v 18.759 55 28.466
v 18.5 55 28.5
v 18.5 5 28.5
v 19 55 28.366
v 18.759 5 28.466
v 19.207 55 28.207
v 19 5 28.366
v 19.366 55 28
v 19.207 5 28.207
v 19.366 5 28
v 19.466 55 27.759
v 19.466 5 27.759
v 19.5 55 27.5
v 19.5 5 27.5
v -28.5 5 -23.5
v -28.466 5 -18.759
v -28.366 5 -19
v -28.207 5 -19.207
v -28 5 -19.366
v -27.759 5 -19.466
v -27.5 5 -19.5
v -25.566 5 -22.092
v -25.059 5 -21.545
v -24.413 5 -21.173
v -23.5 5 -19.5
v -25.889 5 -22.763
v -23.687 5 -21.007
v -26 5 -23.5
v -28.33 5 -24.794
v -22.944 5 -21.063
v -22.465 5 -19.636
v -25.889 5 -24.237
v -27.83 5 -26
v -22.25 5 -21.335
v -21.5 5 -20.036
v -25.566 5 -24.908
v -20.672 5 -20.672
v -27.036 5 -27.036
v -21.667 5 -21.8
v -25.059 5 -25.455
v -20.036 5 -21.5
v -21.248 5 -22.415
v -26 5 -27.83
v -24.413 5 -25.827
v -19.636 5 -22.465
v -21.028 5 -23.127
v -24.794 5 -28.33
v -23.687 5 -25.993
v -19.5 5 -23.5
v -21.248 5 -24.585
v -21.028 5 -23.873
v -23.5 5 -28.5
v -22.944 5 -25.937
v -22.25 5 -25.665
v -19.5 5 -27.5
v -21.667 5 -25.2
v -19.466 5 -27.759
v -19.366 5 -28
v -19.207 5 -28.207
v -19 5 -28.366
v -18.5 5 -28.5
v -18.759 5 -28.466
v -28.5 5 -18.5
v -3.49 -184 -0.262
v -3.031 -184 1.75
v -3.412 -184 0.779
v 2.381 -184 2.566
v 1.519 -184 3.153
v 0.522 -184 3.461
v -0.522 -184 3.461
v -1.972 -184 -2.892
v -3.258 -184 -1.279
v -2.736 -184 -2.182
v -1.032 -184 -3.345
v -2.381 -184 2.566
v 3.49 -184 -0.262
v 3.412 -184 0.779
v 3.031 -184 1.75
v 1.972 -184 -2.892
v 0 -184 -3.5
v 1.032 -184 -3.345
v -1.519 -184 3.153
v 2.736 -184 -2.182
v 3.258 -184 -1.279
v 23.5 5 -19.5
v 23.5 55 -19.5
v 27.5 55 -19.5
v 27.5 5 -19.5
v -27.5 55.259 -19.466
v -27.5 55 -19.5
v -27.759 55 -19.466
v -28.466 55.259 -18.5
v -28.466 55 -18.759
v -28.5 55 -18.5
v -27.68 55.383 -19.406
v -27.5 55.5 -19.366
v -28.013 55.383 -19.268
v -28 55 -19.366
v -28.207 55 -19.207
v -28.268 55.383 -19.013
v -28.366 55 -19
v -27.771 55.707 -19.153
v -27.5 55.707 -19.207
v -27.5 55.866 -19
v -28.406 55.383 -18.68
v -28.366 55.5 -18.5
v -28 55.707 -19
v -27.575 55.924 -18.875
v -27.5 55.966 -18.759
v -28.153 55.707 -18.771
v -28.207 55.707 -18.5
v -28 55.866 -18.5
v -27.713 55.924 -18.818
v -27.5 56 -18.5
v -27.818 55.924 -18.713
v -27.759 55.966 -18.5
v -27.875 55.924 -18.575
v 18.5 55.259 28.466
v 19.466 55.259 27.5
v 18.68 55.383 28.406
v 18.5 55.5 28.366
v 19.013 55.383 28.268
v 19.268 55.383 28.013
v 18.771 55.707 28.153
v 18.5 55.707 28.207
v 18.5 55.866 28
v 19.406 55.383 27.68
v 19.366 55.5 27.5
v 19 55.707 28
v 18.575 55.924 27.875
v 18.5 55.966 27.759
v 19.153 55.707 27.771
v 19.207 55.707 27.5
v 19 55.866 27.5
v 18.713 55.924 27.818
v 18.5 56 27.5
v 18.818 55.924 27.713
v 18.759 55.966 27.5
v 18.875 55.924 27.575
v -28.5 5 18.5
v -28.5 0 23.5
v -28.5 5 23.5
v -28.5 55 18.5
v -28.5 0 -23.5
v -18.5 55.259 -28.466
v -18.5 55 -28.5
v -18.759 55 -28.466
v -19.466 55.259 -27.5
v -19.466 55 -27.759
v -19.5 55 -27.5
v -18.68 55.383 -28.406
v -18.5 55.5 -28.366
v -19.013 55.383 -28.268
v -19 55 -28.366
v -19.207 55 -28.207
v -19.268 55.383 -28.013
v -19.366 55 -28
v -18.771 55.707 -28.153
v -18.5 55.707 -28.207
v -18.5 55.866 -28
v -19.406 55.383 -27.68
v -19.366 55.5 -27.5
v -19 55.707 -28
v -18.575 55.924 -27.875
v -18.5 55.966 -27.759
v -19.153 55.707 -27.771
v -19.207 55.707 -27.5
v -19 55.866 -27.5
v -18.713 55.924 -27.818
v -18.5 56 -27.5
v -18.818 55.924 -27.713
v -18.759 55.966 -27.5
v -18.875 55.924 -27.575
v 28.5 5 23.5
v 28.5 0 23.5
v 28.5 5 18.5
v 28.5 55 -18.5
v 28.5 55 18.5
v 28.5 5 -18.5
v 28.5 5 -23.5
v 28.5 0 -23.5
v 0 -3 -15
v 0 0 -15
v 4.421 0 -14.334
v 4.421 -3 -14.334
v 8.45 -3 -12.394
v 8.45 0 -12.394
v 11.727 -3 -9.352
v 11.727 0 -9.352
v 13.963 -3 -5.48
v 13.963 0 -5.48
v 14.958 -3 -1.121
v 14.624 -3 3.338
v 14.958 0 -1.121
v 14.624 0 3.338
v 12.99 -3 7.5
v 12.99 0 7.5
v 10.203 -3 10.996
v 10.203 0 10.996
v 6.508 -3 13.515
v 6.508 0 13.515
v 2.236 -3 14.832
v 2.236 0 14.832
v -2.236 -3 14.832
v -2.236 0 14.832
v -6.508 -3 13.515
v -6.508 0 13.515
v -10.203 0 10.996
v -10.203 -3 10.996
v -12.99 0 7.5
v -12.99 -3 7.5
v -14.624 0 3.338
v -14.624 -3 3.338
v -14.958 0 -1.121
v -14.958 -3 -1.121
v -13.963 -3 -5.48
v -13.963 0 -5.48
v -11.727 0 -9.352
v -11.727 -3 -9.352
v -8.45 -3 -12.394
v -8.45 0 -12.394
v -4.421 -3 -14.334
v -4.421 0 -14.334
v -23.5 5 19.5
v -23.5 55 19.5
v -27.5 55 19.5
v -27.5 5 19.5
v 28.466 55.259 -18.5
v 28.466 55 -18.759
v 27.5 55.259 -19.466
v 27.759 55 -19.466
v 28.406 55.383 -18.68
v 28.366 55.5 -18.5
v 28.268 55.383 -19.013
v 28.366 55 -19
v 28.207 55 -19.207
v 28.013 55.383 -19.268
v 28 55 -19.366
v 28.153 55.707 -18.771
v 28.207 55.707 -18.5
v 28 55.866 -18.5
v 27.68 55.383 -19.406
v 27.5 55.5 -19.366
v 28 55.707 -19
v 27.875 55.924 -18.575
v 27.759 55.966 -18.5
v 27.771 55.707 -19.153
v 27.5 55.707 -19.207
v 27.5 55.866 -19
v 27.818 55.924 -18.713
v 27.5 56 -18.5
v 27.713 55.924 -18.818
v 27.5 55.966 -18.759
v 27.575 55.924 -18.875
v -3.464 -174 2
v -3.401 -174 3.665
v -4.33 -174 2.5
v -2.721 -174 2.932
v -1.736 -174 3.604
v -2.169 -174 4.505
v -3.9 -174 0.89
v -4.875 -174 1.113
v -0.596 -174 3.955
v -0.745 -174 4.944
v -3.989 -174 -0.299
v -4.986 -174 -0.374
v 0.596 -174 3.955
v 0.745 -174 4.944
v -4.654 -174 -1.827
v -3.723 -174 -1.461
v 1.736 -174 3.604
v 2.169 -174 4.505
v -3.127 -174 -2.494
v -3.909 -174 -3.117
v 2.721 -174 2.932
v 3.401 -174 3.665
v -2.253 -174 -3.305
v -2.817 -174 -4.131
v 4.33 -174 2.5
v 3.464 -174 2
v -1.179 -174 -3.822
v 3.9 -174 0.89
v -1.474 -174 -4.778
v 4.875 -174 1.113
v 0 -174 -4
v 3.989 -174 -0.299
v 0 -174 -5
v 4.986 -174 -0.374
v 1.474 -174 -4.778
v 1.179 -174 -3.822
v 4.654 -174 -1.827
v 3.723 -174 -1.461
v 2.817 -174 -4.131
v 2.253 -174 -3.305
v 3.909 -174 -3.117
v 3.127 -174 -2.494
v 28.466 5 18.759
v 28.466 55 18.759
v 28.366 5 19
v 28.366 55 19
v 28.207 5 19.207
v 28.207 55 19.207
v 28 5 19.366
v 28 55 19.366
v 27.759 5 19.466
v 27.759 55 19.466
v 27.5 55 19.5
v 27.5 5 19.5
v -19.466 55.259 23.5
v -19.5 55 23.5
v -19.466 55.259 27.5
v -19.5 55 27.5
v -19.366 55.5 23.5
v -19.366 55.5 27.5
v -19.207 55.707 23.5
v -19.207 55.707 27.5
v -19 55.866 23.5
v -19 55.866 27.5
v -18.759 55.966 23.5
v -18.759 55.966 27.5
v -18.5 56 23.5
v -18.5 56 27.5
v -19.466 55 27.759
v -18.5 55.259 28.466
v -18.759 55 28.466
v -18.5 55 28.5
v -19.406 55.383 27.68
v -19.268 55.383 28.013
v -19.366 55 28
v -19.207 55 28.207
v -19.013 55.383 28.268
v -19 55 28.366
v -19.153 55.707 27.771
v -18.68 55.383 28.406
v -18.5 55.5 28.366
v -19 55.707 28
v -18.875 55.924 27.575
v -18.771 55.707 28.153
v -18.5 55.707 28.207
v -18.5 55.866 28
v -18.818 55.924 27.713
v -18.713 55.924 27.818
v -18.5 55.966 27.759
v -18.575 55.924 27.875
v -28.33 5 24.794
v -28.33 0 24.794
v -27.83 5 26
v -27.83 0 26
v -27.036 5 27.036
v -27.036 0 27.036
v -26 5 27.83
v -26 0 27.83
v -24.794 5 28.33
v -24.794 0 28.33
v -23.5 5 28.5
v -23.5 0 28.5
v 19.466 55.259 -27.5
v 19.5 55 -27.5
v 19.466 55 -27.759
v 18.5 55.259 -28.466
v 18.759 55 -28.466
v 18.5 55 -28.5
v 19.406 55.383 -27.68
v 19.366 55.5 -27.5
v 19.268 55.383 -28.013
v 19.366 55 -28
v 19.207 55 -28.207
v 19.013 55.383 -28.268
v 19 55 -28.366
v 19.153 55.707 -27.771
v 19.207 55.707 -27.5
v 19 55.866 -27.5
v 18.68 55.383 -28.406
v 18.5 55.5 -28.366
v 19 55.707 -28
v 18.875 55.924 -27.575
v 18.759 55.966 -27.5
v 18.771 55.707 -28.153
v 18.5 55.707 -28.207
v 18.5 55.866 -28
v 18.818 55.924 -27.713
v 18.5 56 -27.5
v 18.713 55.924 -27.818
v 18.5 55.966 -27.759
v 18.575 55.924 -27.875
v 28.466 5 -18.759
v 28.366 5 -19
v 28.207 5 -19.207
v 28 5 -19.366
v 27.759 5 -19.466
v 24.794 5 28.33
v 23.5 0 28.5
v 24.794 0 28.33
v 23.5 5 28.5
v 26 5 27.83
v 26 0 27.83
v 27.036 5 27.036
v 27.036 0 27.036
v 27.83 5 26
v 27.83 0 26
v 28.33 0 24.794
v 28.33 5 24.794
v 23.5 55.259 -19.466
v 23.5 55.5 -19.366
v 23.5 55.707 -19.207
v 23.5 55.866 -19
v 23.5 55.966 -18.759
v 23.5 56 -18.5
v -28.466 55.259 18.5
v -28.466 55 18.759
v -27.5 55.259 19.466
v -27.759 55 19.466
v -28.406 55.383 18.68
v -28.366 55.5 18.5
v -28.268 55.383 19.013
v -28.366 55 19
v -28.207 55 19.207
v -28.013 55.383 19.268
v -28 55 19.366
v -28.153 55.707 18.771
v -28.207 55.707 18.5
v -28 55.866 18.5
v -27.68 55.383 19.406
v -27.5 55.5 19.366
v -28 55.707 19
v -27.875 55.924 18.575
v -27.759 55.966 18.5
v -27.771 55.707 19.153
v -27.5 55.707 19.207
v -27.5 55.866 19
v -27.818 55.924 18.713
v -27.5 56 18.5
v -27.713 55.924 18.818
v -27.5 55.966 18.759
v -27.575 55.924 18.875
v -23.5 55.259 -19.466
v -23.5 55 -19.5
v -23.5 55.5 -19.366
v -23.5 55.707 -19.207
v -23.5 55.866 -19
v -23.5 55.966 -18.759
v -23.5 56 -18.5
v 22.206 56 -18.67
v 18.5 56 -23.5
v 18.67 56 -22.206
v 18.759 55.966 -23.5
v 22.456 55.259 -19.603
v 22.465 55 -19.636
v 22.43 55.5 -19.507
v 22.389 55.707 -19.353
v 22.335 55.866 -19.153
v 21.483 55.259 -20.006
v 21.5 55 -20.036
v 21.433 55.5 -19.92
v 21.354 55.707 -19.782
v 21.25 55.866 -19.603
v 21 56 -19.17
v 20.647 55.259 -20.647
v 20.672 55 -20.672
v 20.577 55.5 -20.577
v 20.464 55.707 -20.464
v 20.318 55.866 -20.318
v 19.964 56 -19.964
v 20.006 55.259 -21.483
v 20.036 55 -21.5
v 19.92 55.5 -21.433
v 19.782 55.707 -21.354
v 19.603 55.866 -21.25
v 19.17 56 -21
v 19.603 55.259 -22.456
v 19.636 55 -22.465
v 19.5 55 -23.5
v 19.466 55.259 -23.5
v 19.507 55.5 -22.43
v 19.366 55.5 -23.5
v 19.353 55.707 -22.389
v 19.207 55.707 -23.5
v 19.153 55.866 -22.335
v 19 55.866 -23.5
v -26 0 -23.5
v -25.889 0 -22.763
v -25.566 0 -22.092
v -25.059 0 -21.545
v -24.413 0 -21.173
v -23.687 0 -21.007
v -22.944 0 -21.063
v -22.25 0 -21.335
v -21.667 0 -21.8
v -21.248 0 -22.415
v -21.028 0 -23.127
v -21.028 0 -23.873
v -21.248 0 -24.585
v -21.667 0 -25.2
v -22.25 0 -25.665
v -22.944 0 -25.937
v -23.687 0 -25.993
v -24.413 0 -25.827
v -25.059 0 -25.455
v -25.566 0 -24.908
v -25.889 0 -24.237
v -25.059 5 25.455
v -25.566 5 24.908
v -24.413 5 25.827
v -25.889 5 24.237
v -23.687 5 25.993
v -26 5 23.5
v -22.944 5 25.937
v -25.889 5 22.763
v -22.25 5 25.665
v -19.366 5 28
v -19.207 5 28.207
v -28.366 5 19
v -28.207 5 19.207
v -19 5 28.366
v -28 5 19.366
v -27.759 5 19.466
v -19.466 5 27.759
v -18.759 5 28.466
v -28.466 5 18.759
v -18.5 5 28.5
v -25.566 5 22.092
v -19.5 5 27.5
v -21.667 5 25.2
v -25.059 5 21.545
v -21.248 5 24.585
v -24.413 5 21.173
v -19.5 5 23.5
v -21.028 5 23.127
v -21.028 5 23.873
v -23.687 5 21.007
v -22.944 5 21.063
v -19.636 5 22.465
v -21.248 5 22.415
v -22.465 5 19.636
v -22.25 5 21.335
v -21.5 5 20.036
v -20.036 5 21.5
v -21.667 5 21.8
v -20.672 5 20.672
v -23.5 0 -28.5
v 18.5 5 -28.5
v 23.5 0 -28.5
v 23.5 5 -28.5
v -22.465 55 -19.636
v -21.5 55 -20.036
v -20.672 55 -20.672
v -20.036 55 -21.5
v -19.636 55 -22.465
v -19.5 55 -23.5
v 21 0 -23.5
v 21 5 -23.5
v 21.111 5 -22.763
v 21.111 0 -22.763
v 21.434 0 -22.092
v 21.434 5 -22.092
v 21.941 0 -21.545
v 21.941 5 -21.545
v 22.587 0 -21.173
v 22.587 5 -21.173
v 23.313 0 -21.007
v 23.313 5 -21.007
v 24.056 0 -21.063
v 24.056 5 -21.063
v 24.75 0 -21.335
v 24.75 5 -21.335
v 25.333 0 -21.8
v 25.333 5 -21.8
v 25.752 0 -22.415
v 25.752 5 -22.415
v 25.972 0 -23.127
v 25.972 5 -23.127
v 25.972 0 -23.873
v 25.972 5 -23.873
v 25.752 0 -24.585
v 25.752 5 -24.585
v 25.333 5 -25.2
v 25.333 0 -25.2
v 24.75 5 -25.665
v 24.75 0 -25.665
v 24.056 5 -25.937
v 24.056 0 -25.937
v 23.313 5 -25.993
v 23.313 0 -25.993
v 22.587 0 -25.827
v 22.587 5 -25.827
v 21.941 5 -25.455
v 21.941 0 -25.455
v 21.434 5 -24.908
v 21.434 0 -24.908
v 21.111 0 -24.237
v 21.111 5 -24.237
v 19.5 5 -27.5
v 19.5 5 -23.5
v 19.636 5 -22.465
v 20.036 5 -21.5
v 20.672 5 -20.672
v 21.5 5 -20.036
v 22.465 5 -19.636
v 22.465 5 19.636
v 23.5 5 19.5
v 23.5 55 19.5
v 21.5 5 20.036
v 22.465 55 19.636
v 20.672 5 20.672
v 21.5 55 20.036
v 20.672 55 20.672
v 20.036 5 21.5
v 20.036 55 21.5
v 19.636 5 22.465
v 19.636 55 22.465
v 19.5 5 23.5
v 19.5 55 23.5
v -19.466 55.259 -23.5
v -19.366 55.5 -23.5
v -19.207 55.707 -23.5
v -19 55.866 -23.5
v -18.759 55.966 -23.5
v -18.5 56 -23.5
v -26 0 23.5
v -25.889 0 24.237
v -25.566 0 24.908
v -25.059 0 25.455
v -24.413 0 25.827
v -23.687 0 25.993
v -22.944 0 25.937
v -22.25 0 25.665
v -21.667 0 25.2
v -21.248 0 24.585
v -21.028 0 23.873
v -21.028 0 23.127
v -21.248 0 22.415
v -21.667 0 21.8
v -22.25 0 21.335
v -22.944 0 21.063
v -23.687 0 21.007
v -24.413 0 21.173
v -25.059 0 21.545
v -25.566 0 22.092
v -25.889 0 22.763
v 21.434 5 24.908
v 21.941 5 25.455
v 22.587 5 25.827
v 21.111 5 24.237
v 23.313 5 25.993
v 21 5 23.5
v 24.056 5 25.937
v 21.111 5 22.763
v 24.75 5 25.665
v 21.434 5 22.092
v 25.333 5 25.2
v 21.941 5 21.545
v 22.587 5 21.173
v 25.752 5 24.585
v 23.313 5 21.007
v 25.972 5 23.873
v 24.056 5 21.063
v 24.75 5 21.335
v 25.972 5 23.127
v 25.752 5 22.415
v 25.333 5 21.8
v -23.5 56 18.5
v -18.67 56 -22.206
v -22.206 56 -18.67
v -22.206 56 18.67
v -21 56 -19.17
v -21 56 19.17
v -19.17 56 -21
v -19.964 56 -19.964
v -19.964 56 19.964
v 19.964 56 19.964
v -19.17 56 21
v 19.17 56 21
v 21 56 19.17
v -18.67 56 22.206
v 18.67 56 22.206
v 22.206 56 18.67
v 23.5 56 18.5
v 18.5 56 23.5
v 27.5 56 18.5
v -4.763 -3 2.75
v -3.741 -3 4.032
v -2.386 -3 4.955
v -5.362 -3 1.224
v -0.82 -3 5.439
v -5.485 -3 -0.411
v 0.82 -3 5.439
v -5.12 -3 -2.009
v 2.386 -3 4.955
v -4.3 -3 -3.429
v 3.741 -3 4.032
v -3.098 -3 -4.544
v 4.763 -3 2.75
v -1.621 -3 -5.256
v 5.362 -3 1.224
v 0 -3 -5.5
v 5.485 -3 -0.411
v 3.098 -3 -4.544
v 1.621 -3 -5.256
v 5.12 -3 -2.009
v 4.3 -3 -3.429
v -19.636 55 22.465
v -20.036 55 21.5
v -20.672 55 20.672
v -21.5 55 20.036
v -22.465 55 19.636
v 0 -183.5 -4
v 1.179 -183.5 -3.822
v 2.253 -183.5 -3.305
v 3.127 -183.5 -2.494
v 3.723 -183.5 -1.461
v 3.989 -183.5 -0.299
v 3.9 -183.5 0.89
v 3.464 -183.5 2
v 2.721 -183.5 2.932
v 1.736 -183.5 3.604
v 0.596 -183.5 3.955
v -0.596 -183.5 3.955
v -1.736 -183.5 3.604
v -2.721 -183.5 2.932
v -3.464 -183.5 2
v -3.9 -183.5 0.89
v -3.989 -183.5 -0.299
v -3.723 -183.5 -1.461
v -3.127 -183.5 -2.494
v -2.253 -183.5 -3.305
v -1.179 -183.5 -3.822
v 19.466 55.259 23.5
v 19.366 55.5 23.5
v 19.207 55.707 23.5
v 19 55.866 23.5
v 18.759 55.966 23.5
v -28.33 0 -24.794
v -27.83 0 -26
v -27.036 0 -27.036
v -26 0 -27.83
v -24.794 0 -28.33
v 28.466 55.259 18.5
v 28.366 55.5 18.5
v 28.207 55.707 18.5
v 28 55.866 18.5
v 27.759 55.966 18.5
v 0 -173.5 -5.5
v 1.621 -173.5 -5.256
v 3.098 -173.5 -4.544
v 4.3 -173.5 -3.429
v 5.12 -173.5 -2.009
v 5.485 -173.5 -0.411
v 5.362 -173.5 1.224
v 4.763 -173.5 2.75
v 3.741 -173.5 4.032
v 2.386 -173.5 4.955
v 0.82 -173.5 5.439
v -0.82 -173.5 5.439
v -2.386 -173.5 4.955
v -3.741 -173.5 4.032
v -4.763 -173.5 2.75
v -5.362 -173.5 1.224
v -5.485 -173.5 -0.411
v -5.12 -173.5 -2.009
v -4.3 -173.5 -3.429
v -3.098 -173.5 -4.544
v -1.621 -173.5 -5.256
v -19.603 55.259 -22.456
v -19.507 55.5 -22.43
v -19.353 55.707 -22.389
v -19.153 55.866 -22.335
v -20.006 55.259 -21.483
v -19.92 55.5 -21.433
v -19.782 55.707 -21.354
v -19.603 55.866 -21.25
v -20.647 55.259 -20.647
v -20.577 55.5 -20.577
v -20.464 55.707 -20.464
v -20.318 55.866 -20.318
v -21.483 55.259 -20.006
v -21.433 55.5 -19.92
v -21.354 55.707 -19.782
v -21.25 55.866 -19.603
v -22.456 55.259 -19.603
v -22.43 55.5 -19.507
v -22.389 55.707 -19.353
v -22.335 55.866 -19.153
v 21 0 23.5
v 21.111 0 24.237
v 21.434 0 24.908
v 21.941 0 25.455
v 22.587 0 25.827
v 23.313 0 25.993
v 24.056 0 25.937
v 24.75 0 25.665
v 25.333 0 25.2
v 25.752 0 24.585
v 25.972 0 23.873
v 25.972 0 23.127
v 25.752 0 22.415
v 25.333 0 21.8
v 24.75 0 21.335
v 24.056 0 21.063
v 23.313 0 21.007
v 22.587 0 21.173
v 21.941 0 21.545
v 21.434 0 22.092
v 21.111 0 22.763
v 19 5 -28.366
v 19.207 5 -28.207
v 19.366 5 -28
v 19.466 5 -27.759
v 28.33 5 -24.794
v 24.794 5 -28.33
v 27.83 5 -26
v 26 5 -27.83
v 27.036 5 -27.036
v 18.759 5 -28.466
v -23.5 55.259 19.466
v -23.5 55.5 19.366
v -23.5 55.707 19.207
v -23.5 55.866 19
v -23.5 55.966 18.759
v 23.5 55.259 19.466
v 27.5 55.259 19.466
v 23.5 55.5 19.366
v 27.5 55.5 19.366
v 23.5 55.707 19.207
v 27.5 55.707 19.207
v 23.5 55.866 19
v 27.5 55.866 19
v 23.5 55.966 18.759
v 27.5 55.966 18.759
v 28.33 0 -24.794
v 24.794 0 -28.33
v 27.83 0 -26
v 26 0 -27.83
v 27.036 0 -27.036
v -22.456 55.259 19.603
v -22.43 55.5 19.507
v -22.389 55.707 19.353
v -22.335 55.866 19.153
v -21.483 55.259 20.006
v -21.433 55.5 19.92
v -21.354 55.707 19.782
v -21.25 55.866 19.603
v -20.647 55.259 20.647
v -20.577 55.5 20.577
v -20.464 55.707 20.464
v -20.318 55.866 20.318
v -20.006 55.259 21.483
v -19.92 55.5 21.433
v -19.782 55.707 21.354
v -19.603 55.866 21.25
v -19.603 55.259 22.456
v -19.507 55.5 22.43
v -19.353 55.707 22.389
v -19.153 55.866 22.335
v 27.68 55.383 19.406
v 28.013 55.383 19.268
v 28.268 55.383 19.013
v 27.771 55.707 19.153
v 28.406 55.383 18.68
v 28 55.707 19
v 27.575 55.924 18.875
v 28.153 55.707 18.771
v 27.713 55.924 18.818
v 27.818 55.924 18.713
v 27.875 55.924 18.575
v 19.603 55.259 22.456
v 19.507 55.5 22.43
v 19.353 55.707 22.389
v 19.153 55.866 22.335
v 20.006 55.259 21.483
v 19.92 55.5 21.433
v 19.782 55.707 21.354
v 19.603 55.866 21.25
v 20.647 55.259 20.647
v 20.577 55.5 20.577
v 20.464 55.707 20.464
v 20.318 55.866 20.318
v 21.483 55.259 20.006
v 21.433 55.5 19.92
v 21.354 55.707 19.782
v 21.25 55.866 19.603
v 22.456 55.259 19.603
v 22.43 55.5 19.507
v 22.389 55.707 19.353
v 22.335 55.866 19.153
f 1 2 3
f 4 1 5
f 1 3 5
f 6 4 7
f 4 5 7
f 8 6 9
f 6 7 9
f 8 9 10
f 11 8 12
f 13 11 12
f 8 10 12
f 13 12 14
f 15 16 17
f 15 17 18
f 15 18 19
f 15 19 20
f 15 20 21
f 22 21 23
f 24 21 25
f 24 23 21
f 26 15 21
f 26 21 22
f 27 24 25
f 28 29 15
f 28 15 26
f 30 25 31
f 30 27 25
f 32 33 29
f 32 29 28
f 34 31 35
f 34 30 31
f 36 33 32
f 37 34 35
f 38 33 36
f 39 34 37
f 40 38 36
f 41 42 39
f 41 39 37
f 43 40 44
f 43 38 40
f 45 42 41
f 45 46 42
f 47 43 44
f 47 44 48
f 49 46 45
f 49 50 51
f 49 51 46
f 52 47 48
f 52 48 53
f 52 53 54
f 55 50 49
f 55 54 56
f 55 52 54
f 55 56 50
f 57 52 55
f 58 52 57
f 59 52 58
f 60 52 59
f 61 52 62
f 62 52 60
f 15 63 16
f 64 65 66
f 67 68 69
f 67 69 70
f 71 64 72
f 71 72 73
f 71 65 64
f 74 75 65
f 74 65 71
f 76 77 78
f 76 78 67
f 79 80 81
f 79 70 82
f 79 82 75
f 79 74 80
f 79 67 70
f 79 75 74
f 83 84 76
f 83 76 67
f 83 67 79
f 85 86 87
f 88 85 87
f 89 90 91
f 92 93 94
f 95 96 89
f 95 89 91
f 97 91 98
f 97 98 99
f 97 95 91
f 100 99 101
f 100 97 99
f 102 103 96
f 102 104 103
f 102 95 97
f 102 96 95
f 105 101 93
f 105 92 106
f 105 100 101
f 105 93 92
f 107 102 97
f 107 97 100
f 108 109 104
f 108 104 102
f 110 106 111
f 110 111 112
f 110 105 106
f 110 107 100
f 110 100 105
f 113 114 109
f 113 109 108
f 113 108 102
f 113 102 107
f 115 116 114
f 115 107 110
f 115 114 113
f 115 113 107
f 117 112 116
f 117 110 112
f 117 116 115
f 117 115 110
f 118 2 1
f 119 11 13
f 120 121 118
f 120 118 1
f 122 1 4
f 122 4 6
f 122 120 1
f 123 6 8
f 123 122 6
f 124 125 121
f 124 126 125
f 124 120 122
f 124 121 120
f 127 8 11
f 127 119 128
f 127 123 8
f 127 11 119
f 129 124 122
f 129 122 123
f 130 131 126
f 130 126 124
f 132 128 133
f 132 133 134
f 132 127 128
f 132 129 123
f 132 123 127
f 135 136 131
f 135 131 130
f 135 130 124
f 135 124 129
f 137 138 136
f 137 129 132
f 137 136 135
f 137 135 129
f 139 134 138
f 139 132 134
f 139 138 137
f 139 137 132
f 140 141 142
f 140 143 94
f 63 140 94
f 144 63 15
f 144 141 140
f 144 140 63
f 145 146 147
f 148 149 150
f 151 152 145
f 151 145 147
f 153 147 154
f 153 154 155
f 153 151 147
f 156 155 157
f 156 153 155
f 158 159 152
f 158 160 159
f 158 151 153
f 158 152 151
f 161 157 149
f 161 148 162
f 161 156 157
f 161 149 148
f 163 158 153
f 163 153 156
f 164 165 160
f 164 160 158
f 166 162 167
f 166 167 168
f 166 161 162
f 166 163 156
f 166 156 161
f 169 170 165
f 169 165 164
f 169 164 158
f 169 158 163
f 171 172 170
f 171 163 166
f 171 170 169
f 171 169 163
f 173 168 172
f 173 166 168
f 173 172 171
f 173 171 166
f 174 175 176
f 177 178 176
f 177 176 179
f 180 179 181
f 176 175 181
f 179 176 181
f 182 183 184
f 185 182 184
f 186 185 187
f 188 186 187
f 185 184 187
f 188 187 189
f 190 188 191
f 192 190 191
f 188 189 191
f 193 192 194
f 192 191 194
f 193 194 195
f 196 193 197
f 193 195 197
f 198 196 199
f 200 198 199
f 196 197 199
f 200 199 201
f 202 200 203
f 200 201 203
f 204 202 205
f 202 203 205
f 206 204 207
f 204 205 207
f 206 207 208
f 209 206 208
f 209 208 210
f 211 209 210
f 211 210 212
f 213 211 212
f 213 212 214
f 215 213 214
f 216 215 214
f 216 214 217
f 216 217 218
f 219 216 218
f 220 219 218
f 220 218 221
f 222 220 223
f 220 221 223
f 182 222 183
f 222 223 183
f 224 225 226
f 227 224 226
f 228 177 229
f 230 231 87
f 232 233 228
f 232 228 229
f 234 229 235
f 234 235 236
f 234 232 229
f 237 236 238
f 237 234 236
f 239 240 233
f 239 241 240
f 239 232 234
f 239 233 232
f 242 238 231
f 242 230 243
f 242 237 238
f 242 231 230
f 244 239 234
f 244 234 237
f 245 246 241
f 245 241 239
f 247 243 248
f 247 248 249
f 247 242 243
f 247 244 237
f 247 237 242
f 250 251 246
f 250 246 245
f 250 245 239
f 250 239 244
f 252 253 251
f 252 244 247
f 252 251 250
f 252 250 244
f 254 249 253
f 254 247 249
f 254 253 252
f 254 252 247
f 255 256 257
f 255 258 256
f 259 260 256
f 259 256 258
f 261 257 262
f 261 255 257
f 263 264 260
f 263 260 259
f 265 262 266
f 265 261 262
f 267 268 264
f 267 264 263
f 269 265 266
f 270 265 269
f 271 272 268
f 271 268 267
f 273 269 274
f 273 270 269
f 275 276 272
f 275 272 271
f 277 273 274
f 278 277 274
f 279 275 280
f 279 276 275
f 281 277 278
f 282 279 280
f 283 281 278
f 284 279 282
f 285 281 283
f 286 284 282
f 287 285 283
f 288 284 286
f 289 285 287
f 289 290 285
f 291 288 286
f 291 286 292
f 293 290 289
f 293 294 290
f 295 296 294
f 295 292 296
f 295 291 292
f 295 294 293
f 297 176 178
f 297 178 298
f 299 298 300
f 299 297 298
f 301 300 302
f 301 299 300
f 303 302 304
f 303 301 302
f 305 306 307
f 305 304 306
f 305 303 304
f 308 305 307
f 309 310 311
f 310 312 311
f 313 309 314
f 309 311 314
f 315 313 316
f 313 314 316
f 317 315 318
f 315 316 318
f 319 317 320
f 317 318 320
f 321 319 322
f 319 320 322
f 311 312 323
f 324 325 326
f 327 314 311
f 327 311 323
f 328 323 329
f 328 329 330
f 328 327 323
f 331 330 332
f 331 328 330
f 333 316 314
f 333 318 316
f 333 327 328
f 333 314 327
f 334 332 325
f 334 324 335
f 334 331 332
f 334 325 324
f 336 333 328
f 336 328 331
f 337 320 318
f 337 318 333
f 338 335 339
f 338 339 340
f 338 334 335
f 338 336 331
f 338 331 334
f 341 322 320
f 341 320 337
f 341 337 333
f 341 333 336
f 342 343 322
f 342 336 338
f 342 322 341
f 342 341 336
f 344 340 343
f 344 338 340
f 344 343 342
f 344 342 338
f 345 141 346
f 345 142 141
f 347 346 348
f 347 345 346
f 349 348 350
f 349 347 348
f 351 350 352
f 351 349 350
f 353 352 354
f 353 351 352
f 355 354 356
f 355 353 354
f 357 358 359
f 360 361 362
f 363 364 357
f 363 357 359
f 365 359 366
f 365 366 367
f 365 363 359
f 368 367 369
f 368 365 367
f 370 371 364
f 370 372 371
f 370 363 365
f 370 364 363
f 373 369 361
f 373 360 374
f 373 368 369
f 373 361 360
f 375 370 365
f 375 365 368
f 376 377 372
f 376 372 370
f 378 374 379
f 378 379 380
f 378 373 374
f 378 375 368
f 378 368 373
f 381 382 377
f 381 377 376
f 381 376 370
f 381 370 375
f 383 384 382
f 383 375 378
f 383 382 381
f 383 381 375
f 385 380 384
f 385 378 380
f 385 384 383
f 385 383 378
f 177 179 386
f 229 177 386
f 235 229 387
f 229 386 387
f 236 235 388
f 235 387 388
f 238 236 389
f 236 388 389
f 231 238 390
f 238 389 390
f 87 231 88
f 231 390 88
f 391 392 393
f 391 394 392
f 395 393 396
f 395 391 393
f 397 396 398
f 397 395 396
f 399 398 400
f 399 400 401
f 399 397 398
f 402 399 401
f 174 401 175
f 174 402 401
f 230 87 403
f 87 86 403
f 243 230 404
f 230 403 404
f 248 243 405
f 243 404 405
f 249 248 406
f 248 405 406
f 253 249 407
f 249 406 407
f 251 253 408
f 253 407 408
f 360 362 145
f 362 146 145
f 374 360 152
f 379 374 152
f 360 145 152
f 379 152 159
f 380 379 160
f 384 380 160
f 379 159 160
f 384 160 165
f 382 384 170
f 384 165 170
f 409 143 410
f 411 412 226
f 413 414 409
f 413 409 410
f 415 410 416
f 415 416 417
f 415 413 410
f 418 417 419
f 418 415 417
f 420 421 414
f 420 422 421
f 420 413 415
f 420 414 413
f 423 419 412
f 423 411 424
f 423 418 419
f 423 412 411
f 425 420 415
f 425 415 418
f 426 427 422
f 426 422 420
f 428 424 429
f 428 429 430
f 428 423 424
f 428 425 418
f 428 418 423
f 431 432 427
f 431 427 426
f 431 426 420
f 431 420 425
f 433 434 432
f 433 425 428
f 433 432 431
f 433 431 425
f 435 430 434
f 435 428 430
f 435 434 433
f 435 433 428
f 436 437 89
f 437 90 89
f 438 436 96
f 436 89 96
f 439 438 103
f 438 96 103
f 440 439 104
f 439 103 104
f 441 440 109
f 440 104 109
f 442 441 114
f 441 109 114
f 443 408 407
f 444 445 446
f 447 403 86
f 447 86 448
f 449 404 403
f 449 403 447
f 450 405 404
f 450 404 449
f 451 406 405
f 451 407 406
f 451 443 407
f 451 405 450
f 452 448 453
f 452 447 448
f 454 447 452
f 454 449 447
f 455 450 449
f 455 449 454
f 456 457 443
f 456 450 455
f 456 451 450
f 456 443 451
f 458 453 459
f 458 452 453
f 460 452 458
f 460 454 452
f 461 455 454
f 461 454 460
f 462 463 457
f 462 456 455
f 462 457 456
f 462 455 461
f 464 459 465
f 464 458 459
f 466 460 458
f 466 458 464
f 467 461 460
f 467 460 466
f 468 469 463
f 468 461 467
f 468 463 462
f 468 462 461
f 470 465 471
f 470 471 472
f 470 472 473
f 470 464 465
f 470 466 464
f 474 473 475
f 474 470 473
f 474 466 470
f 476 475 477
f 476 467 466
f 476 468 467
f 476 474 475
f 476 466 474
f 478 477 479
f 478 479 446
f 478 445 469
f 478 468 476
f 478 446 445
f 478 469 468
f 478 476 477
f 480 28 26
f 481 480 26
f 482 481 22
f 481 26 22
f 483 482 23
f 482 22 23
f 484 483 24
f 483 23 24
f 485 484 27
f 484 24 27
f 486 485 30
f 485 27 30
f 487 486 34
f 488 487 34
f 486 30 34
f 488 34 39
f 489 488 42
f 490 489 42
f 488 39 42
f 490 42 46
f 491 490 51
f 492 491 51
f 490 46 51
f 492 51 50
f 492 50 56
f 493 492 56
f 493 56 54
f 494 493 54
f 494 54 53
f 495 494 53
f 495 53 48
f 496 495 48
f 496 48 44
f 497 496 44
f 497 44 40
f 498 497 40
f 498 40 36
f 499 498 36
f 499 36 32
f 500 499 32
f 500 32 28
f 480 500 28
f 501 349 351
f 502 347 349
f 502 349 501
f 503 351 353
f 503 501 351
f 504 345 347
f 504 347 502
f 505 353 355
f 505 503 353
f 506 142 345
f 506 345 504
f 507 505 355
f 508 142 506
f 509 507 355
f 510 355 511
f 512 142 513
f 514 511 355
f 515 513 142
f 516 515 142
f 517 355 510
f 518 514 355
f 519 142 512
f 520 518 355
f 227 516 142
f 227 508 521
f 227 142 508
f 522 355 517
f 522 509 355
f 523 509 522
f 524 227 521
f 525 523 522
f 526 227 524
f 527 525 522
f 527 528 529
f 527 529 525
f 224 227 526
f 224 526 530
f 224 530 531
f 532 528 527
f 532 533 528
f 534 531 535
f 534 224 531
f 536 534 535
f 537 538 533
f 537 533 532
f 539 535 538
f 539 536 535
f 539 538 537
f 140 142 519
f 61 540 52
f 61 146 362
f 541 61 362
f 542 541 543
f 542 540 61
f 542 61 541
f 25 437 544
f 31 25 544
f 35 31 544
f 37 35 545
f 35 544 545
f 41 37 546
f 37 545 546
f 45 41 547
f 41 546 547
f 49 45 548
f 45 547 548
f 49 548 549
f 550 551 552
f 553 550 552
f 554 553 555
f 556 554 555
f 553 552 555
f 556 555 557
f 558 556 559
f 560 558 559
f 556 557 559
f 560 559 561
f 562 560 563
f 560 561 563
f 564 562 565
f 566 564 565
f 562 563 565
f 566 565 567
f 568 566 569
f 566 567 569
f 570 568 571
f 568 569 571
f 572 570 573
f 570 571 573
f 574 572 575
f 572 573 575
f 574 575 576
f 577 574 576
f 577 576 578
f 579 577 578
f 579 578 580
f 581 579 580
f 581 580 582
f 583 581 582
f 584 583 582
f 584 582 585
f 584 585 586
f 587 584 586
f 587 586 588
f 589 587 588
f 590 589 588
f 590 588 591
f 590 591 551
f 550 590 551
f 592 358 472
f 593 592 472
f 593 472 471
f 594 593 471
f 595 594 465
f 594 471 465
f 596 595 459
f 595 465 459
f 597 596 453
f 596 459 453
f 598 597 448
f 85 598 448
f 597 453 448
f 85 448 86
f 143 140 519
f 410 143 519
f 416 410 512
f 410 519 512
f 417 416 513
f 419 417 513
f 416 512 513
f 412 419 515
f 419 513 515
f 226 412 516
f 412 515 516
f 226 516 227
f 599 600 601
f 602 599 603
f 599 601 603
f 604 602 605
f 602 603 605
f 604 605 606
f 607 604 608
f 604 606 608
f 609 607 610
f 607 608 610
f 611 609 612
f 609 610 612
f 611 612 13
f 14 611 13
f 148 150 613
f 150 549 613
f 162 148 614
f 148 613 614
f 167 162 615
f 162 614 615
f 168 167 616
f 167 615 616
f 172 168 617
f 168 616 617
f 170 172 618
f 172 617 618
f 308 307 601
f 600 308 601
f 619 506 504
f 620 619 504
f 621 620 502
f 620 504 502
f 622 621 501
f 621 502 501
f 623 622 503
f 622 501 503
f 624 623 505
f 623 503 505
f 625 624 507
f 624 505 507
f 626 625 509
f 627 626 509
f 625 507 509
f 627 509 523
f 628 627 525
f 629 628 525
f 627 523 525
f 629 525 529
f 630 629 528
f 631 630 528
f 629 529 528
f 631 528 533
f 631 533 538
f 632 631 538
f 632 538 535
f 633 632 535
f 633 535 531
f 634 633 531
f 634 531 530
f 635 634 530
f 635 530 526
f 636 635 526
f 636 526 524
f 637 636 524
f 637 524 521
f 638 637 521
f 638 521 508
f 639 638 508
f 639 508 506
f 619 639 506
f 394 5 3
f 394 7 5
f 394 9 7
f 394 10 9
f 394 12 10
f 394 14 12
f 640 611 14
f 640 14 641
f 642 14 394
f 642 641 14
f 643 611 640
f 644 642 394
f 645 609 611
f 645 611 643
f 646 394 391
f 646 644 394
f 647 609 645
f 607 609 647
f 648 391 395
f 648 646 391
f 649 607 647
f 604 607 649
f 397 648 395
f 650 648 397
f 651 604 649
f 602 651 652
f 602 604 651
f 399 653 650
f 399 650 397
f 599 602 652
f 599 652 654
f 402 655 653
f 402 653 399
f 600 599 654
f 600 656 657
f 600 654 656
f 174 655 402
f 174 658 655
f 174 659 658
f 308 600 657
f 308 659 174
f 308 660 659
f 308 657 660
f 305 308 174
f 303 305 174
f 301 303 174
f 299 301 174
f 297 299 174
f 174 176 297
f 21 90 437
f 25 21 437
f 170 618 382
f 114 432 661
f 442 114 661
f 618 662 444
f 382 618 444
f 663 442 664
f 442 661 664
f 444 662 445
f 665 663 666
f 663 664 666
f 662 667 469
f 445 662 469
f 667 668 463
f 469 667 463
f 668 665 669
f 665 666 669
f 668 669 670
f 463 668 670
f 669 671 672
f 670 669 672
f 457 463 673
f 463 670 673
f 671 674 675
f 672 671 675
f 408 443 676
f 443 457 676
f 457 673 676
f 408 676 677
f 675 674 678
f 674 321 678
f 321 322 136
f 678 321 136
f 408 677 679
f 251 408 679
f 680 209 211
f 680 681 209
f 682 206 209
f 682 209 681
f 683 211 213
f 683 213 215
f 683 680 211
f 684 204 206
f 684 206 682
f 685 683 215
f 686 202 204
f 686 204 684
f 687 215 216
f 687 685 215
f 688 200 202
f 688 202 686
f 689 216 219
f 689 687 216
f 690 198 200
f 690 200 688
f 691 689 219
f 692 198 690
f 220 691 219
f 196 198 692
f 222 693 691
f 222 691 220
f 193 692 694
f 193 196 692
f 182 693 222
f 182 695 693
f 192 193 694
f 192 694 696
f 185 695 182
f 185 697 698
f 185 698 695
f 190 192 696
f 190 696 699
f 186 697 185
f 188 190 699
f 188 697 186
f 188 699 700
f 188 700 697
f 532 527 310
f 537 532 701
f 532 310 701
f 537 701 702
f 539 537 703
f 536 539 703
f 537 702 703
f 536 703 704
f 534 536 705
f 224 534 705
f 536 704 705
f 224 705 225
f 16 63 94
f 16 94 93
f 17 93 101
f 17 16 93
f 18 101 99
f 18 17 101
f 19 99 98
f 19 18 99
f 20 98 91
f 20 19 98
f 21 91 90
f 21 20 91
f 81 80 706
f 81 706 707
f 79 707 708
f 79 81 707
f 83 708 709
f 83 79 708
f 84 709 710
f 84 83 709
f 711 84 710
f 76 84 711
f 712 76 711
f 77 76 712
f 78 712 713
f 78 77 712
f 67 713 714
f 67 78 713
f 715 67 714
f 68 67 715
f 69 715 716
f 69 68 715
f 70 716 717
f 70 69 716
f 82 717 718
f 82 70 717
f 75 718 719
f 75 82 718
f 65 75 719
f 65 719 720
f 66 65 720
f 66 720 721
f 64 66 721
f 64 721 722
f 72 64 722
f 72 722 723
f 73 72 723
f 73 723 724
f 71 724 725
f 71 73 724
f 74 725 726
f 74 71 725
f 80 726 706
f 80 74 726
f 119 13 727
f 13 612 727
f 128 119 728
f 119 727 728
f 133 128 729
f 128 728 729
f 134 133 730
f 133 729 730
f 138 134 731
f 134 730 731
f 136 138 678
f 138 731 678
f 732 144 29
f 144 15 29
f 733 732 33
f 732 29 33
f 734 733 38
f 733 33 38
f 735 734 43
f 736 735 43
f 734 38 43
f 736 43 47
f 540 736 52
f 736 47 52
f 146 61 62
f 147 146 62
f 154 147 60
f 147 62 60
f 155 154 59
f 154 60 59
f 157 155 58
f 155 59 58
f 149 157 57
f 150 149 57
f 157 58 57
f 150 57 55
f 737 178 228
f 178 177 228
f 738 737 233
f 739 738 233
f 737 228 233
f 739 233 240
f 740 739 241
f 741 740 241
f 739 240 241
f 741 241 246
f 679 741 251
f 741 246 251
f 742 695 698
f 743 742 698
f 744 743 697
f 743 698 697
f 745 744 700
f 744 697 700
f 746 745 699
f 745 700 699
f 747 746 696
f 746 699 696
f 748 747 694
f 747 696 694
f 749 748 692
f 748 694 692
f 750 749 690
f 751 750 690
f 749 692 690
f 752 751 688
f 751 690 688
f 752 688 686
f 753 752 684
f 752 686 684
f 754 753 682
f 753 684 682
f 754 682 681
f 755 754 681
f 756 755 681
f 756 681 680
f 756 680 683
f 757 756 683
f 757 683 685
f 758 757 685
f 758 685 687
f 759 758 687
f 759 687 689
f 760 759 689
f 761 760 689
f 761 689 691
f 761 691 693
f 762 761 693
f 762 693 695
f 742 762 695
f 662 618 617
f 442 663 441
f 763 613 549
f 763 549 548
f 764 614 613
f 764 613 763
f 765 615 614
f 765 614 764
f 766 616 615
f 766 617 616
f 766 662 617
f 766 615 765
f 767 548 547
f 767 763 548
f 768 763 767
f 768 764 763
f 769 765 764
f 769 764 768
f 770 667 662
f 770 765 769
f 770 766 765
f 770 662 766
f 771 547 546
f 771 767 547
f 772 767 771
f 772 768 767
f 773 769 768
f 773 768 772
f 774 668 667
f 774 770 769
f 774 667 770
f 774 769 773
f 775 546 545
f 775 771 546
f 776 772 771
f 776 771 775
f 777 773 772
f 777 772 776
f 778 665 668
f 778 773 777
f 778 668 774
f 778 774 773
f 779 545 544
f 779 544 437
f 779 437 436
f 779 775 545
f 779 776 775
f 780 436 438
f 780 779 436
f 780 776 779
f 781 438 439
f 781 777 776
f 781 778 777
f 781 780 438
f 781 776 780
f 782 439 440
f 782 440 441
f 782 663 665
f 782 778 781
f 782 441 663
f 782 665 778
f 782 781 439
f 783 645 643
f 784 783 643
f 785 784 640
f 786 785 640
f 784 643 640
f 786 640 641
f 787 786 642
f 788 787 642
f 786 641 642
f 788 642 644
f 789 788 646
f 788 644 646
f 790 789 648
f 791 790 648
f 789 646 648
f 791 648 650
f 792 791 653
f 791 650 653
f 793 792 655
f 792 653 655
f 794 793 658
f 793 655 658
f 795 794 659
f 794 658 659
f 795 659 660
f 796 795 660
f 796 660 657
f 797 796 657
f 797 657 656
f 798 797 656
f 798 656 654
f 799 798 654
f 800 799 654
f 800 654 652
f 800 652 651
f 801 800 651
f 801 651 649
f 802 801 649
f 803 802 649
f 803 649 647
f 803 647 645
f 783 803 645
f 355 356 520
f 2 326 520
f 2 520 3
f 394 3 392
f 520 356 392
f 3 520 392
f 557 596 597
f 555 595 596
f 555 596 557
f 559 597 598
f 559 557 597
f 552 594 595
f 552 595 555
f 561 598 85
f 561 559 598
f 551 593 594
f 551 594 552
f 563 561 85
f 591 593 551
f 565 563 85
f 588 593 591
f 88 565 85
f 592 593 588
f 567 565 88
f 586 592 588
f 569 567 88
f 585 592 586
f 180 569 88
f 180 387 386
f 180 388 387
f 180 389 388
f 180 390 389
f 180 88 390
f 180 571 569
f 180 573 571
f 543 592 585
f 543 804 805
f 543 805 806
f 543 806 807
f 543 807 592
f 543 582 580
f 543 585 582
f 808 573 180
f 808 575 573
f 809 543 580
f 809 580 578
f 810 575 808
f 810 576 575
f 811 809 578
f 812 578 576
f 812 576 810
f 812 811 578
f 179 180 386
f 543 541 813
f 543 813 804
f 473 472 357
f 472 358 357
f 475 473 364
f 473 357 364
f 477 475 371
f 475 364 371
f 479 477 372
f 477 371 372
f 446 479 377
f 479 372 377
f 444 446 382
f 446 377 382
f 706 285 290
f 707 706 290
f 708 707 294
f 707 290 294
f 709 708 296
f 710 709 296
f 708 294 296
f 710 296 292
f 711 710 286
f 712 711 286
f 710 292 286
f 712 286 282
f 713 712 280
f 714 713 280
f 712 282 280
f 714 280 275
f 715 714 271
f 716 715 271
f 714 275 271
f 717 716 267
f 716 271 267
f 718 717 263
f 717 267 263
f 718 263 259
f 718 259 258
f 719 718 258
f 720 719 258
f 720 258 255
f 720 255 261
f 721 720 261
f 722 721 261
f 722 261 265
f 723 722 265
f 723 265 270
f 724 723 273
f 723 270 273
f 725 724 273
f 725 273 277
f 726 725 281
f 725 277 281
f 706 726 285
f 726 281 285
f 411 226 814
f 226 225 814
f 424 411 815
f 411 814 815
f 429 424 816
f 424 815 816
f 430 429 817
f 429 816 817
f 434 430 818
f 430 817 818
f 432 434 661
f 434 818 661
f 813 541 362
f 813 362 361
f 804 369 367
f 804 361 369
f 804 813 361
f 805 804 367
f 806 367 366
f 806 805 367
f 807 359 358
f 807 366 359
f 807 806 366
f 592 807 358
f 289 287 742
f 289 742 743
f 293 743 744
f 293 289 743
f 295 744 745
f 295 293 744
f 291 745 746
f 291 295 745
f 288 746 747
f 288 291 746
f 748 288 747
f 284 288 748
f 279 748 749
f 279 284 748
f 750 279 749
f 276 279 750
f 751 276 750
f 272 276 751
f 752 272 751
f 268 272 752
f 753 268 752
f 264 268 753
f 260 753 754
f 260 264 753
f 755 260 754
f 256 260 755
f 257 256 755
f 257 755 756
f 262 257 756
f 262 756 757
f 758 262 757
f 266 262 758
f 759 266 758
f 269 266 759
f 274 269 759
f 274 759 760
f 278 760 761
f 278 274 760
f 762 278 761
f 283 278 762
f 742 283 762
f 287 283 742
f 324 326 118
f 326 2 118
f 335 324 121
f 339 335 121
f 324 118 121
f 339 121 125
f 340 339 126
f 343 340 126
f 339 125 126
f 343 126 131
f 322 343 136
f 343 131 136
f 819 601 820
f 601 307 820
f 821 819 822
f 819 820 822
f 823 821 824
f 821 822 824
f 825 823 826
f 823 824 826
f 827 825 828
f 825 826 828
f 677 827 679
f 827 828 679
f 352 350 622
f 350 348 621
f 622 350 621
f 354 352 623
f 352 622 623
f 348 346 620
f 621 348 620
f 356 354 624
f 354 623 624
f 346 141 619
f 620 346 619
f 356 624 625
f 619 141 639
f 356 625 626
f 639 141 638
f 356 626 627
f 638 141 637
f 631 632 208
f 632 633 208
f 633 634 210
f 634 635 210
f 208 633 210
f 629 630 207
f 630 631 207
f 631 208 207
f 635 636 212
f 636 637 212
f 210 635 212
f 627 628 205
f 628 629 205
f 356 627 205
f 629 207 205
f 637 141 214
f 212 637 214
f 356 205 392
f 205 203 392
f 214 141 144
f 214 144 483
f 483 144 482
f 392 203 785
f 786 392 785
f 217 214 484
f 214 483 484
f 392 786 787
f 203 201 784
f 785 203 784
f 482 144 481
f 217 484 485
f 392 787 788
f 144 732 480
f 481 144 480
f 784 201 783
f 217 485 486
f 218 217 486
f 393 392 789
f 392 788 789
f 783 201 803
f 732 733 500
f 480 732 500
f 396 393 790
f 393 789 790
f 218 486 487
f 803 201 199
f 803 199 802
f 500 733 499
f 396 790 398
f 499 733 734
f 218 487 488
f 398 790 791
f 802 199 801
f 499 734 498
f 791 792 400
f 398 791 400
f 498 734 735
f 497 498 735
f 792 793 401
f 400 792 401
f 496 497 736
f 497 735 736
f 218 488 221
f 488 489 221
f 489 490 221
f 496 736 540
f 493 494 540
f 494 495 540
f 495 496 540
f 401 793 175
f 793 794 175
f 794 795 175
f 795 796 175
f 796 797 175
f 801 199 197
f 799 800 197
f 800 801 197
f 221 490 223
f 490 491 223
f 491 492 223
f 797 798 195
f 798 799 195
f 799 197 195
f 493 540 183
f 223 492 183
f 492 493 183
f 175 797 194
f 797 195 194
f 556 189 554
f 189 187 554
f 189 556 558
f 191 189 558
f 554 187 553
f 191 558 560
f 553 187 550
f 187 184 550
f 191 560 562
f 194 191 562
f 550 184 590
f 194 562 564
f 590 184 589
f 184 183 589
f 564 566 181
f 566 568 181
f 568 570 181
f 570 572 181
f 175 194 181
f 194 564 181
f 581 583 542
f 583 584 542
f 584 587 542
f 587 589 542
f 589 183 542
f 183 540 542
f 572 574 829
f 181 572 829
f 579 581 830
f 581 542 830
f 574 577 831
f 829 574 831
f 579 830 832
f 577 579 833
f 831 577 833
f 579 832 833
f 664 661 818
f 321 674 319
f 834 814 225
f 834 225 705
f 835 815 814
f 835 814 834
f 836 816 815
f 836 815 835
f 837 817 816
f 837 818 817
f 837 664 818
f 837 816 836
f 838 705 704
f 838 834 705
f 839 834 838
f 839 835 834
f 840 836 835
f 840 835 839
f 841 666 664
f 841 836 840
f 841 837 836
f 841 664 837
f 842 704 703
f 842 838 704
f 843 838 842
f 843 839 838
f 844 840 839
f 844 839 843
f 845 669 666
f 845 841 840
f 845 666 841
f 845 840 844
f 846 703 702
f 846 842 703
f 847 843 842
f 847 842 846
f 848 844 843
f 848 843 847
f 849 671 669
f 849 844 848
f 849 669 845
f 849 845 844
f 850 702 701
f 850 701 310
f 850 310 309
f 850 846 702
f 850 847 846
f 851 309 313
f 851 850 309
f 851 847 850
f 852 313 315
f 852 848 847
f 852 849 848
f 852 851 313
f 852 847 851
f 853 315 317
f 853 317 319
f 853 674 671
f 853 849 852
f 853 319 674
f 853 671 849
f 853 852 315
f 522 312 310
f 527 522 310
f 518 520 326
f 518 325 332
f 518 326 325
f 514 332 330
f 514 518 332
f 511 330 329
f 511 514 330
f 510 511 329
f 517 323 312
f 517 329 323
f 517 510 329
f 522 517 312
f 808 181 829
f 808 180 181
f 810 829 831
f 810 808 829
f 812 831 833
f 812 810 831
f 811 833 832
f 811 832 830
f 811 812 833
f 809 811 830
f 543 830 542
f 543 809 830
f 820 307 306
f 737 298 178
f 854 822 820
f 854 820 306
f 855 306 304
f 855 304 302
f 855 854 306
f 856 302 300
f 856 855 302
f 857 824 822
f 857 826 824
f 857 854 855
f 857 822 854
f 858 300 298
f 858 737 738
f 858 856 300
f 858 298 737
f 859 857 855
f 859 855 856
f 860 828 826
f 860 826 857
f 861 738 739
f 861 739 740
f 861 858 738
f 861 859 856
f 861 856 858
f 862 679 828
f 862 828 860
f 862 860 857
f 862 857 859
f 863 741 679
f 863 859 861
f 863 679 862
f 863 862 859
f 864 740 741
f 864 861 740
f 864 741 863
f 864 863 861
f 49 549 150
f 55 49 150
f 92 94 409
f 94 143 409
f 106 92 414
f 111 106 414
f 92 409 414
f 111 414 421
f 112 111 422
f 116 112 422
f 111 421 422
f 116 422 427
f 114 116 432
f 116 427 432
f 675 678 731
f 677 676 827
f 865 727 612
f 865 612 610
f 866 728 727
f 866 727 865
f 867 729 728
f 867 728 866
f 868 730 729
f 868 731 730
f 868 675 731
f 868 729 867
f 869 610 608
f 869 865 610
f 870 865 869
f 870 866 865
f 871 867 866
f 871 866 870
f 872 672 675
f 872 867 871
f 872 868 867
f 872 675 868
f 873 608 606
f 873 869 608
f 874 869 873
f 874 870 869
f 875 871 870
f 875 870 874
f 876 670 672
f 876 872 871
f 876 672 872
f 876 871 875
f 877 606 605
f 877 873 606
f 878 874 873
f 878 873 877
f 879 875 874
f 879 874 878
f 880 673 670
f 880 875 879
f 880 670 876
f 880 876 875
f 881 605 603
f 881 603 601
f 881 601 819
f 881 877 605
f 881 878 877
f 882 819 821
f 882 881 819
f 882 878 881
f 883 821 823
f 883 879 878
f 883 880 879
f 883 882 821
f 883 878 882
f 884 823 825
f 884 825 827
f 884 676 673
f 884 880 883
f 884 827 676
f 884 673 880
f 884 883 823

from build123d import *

# Parameters (mm, degrees)
SKETCH1_W                = 57
SKETCH1_H                = 57
EXTRUDE1_DEPTH           = 76
F_5_0_5_DIAMETER_HOLE1_D = 5
SKETCH6_R                = 4
SKETCH6_R_2              = 2.5
EXTRUDE4_DEPTH           = 71
FILLET1_R                = 5
SKETCH7_R                = 3
EXTRUDE5_DEPTH           = 101
SKETCH8_R                = 15
EXTRUDE6_DEPTH           = 3
FILLET2_R                = 1
SKETCH9_R                = 5.5
BOSS_EXTRUDE1_DEPTH      = 174
CHAMFER1_SIZE            = 0.5
SKETCH10_R               = 4
BOSS_EXTRUDE2_DEPTH      = 10
CHAMFER2_SIZE            = 0.5
CUT_EXTRUDE1_REACH       = 196.724
SKETCH11_W               = 136.965596246
SKETCH11_H               = 58.892429462
FILLET3_R                = 1


with BuildPart() as part:
    # Sketch1 → Extrude1 (new body)
    with BuildSketch(Plane(origin=(0, 0, 0), x_dir=(1, 0, 0), z_dir=(0, 1, 0))):
        Rectangle(SKETCH1_W, SKETCH1_H)
    extrude(amount=EXTRUDE1_DEPTH)

    # Ø5.0 (5) Diameter Hole1 (through all)
    with Locations(Plane.XZ):
        with Locations((-23.5, 23.5), (23.5, 23.5), (23.5, -23.5), (-23.5, -23.5)):
            Hole(F_5_0_5_DIAMETER_HOLE1_D / 2)

    # Sketch6 → Extrude4 (cut)
    # profile 1 of 12: a face of its own
    with BuildSketch(Plane(origin=(0, 76, 0), x_dir=(1, 0, 0), z_dir=(0, 1, 0))):
        Polygon((-28.5, 28.5), (-19.5, 28.5), (-19.5, 32.511741208), (-33.908905561, 32.511741208), (-33.908905561, 19.5), (-28.5, 19.5), align=None)
    # profile 2 of 12: a face of its own
    with BuildSketch(Plane(origin=(0, 76, 0), x_dir=(1, 0, 0), z_dir=(0, 1, 0))):
        with BuildLine():
            ThreePointArc((-23.5, 19.5), (-26.328427125, 26.328427125), (-19.5, 23.5))
            Line((-19.5, 23.5), (-19.5, 28.5))
            Line((-19.5, 28.5), (-28.5, 28.5))
            Line((-28.5, 28.5), (-28.5, 19.5))
            Line((-28.5, 19.5), (-23.5, 19.5))
        make_face()
    # profile 3 of 12: a face of its own
    with BuildSketch(Plane(origin=(0, 76, 0), x_dir=(1, 0, 0), z_dir=(0, 1, 0))):
        with Locations((-23.5, 23.5)):
            Circle(SKETCH6_R)
        with Locations(Location((-23.5, 23.5, 0), (0, 0, 90))):
            Circle(SKETCH6_R_2, mode=Mode.SUBTRACT)
    # profile 4 of 12: a face of its own
    with BuildSketch(Plane(origin=(0, 76, 0), x_dir=(1, 0, 0), z_dir=(0, 1, 0))):
        Polygon((19.5, 36.471560472), (19.5, 28.5), (28.5, 28.5), (28.5, 19.5), (41.168352552, 19.5), (41.168352552, 36.471560472), align=None)
    # profile 5 of 12: a face of its own
    with BuildSketch(Plane(origin=(0, 76, 0), x_dir=(1, 0, 0), z_dir=(0, 1, 0))):
        with BuildLine():
            Line((28.5, 28.5), (19.5, 28.5))
            Line((19.5, 28.5), (19.5, 23.5))
            ThreePointArc((19.5, 23.5), (23.5, 27.5), (27.5, 23.5))
            ThreePointArc((27.5, 23.5), (26.328427125, 20.671572875), (23.5, 19.5))
            Line((23.5, 19.5), (28.5, 19.5))
            Line((28.5, 19.5), (28.5, 28.5))
        make_face()
    # profile 6 of 12: a face of its own
    with BuildSketch(Plane(origin=(0, 76, 0), x_dir=(1, 0, 0), z_dir=(0, 1, 0))):
        with Locations((23.5, 23.5)):
            Circle(SKETCH6_R)
        with Locations(Location((23.5, 23.5, 0), (0, 0, 90))):
            Circle(SKETCH6_R_2, mode=Mode.SUBTRACT)
    # profile 7 of 12: a face of its own
    with BuildSketch(Plane(origin=(0, 76, 0), x_dir=(1, 0, 0), z_dir=(0, 1, 0))):
        with Locations((23.5, -23.5)):
            Circle(SKETCH6_R)
        with Locations(Location((23.5, -23.5, 0), (0, 0, 90))):
            Circle(SKETCH6_R_2, mode=Mode.SUBTRACT)
    # profile 8 of 12: a face of its own
    with BuildSketch(Plane(origin=(0, 76, 0), x_dir=(1, 0, 0), z_dir=(0, 1, 0))):
        with BuildLine():
            Line((28.5, -28.5), (28.5, -19.5))
            Line((28.5, -19.5), (23.5, -19.5))
            ThreePointArc((23.5, -19.5), (26.328427125, -20.671572875), (27.5, -23.5))
            ThreePointArc((27.5, -23.5), (23.5, -27.5), (19.5, -23.5))
            Line((19.5, -23.5), (19.5, -28.5))
            Line((19.5, -28.5), (28.5, -28.5))
        make_face()
    # profile 9 of 12: a face of its own
    with BuildSketch(Plane(origin=(0, 76, 0), x_dir=(1, 0, 0), z_dir=(0, 1, 0))):
        Polygon((44.252209519, -19.5), (28.5, -19.5), (28.5, -28.5), (19.5, -28.5), (19.5, -40.050429997), (44.252209519, -40.050429997), align=None)
    # profile 10 of 12: a face of its own
    with BuildSketch(Plane(origin=(0, 76, 0), x_dir=(1, 0, 0), z_dir=(0, 1, 0))):
        Polygon((-28.5, -28.5), (-28.5, -19.5), (-37.670786859, -19.5), (-37.670786859, -37.828231874), (-19.5, -37.828231874), (-19.5, -28.5), align=None)
    # profile 11 of 12: a face of its own
    with BuildSketch(Plane(origin=(0, 76, 0), x_dir=(1, 0, 0), z_dir=(0, 1, 0))):
        with BuildLine():
            Line((-23.5, -19.5), (-28.5, -19.5))
            Line((-28.5, -19.5), (-28.5, -28.5))
            Line((-28.5, -28.5), (-19.5, -28.5))
            Line((-19.5, -28.5), (-19.5, -23.5))
            ThreePointArc((-19.5, -23.5), (-26.328427125, -26.328427125), (-23.5, -19.5))
        make_face()
    # profile 12 of 12: a face of its own
    with BuildSketch(Plane(origin=(0, 76, 0), x_dir=(1, 0, 0), z_dir=(0, 1, 0))):
        with Locations((-23.5, -23.5)):
            Circle(SKETCH6_R)
        with Locations(Location((-23.5, -23.5, 0), (0, 0, 90))):
            Circle(SKETCH6_R_2, mode=Mode.SUBTRACT)
    extrude(amount=-EXTRUDE4_DEPTH, mode=Mode.SUBTRACT)

    # Fillet1
    fillet1_edges = [part.edges().sort_by_distance(p)[0] for p in [
        (-28.5, 2.5, 28.5),
        (-28.5, 2.5, -28.5),
        (28.5, 2.5, -28.5),
        (28.5, 2.5, 28.5),
    ]]
    fillet(fillet1_edges, radius=FILLET1_R)



with BuildPart() as body_2:
    # Sketch7 → Extrude5 (new body)
    with BuildSketch(Plane(origin=(0, 76, 0), x_dir=(1, 0, 0), z_dir=(0, 1, 0))):
        with Locations(Location((0, 0, 0), (0, 0, 270))):
            Circle(SKETCH7_R)
    extrude(amount=-EXTRUDE5_DEPTH)


with BuildPart() as part_1:
    add(part.part)

    add(body_2.part)  # Extrude6 merges body 2
    # Sketch8 → Extrude6 (add)
    with BuildSketch(Plane.XZ):
        with Locations(Location((0, 0, 0), (0, 0, 270))):
            Circle(SKETCH8_R)
    extrude(amount=EXTRUDE6_DEPTH)

    # Fillet2
    fillet2_edges = [part_1.edges().sort_by_distance(p)[0] for p in [
        (-28.5, 40.5, 19.5),
        (0, 76, 28.5),
        (-19.5, 40.5, 28.5),
        (-19.5, 76, 26),
        (-20.671572875, 76, 20.671572875),
        (-26, 76, 19.5),
        (-28.5, 76, 0),
        (-28.5, 40.5, -19.5),
        (-19.5, 40.5, -28.5),
        (-19.5, 76, -26),
        (-26, 76, -19.5),
        (-20.671572875, 76, -20.671572875),
        (0, 76, -28.5),
        (19.5, 76, -26),
        (26, 76, -19.5),
        (20.671572875, 76, -20.671572875),
        (19.5, 40.5, -28.5),
        (28.5, 40.5, -19.5),
        (19.5, 40.5, 28.5),
        (28.5, 76, 0),
        (26, 76, 19.5),
        (19.5, 76, 26),
        (20.671572875, 76, 20.671572875),
        (28.5, 40.5, 19.5),
    ]]
    fillet(fillet2_edges, radius=FILLET2_R)

    # Sketch9 → Boss-Extrude1 (add)
    with BuildSketch(Plane.XZ):
        with Locations(Location((0, 0, 0), (0, 0, 270))):
            Circle(SKETCH9_R)
    extrude(amount=BOSS_EXTRUDE1_DEPTH)

    # Chamfer1
    chamfer1_edges = [part_1.edges().sort_by_distance(p)[0] for p in [
        (0, -174, 5.5),
    ]]
    chamfer(chamfer1_edges, length=CHAMFER1_SIZE)

    # Sketch10 → Boss-Extrude2 (add)
    with BuildSketch(Plane.XZ.offset(174)):
        with Locations(Location((0, 0, 0), (0, 0, 270))):
            Circle(SKETCH10_R)
    extrude(amount=BOSS_EXTRUDE2_DEPTH)

    # Chamfer2
    chamfer2_edges = [part_1.edges().sort_by_distance(p)[0] for p in [
        (0, -184, 4),
    ]]
    chamfer(chamfer2_edges, length=CHAMFER2_SIZE)

    # Sketch11 → Cut-Extrude1 (cut, up to next)
    with BuildSketch(Plane.XY.offset(28.5), mode=Mode.PRIVATE) as cut_extrude1_sk1:
        with Locations((0.168266434, 85.446214731)):
            Rectangle(SKETCH11_W, SKETCH11_H)
    cut_extrude1_tool1 = extrude(cut_extrude1_sk1.sketch, amount=-CUT_EXTRUDE1_REACH, mode=Mode.PRIVATE) & part_1.part
    add(cut_extrude1_tool1.solids().sort_by_distance((0.168266, 85.446215, 28.5))[0], mode=Mode.SUBTRACT)

    # Fillet3
    fillet3_edges = [part_1.edges().sort_by_distance(p)[0] for p in [
        (0, 56, 28.5),
        (19.5, 56, 25.5),
        (19.207106781, 56, 28.207106781),
        (-19.207106781, 56, 28.207106781),
        (-28.207106781, 56, 19.207106781),
        (-28.207106781, 56, -19.207106781),
        (-19.207106781, 56, -28.207106781),
        (19.207106781, 56, -28.207106781),
        (19.5, 56, -25.5),
        (25.5, 56, -19.5),
        (28.207106781, 56, -19.207106781),
        (28.207106781, 56, 19.207106781),
        (25.5, 56, 19.5),
        (28.5, 56, 0),
        (0, 56, -28.5),
        (-28.5, 56, 0),
        (-25.5, 56, -19.5),
        (-19.5, 56, -25.5),
        (-20.671572875, 56, -20.671572875),
        (20.671572875, 56, -20.671572875),
        (20.671572875, 56, 20.671572875),
        (-19.5, 56, 25.5),
        (-25.5, 56, 19.5),
        (-20.671572875, 56, 20.671572875),
    ]]
    fillet(fillet3_edges, radius=FILLET3_R)


solid = part_1.part
